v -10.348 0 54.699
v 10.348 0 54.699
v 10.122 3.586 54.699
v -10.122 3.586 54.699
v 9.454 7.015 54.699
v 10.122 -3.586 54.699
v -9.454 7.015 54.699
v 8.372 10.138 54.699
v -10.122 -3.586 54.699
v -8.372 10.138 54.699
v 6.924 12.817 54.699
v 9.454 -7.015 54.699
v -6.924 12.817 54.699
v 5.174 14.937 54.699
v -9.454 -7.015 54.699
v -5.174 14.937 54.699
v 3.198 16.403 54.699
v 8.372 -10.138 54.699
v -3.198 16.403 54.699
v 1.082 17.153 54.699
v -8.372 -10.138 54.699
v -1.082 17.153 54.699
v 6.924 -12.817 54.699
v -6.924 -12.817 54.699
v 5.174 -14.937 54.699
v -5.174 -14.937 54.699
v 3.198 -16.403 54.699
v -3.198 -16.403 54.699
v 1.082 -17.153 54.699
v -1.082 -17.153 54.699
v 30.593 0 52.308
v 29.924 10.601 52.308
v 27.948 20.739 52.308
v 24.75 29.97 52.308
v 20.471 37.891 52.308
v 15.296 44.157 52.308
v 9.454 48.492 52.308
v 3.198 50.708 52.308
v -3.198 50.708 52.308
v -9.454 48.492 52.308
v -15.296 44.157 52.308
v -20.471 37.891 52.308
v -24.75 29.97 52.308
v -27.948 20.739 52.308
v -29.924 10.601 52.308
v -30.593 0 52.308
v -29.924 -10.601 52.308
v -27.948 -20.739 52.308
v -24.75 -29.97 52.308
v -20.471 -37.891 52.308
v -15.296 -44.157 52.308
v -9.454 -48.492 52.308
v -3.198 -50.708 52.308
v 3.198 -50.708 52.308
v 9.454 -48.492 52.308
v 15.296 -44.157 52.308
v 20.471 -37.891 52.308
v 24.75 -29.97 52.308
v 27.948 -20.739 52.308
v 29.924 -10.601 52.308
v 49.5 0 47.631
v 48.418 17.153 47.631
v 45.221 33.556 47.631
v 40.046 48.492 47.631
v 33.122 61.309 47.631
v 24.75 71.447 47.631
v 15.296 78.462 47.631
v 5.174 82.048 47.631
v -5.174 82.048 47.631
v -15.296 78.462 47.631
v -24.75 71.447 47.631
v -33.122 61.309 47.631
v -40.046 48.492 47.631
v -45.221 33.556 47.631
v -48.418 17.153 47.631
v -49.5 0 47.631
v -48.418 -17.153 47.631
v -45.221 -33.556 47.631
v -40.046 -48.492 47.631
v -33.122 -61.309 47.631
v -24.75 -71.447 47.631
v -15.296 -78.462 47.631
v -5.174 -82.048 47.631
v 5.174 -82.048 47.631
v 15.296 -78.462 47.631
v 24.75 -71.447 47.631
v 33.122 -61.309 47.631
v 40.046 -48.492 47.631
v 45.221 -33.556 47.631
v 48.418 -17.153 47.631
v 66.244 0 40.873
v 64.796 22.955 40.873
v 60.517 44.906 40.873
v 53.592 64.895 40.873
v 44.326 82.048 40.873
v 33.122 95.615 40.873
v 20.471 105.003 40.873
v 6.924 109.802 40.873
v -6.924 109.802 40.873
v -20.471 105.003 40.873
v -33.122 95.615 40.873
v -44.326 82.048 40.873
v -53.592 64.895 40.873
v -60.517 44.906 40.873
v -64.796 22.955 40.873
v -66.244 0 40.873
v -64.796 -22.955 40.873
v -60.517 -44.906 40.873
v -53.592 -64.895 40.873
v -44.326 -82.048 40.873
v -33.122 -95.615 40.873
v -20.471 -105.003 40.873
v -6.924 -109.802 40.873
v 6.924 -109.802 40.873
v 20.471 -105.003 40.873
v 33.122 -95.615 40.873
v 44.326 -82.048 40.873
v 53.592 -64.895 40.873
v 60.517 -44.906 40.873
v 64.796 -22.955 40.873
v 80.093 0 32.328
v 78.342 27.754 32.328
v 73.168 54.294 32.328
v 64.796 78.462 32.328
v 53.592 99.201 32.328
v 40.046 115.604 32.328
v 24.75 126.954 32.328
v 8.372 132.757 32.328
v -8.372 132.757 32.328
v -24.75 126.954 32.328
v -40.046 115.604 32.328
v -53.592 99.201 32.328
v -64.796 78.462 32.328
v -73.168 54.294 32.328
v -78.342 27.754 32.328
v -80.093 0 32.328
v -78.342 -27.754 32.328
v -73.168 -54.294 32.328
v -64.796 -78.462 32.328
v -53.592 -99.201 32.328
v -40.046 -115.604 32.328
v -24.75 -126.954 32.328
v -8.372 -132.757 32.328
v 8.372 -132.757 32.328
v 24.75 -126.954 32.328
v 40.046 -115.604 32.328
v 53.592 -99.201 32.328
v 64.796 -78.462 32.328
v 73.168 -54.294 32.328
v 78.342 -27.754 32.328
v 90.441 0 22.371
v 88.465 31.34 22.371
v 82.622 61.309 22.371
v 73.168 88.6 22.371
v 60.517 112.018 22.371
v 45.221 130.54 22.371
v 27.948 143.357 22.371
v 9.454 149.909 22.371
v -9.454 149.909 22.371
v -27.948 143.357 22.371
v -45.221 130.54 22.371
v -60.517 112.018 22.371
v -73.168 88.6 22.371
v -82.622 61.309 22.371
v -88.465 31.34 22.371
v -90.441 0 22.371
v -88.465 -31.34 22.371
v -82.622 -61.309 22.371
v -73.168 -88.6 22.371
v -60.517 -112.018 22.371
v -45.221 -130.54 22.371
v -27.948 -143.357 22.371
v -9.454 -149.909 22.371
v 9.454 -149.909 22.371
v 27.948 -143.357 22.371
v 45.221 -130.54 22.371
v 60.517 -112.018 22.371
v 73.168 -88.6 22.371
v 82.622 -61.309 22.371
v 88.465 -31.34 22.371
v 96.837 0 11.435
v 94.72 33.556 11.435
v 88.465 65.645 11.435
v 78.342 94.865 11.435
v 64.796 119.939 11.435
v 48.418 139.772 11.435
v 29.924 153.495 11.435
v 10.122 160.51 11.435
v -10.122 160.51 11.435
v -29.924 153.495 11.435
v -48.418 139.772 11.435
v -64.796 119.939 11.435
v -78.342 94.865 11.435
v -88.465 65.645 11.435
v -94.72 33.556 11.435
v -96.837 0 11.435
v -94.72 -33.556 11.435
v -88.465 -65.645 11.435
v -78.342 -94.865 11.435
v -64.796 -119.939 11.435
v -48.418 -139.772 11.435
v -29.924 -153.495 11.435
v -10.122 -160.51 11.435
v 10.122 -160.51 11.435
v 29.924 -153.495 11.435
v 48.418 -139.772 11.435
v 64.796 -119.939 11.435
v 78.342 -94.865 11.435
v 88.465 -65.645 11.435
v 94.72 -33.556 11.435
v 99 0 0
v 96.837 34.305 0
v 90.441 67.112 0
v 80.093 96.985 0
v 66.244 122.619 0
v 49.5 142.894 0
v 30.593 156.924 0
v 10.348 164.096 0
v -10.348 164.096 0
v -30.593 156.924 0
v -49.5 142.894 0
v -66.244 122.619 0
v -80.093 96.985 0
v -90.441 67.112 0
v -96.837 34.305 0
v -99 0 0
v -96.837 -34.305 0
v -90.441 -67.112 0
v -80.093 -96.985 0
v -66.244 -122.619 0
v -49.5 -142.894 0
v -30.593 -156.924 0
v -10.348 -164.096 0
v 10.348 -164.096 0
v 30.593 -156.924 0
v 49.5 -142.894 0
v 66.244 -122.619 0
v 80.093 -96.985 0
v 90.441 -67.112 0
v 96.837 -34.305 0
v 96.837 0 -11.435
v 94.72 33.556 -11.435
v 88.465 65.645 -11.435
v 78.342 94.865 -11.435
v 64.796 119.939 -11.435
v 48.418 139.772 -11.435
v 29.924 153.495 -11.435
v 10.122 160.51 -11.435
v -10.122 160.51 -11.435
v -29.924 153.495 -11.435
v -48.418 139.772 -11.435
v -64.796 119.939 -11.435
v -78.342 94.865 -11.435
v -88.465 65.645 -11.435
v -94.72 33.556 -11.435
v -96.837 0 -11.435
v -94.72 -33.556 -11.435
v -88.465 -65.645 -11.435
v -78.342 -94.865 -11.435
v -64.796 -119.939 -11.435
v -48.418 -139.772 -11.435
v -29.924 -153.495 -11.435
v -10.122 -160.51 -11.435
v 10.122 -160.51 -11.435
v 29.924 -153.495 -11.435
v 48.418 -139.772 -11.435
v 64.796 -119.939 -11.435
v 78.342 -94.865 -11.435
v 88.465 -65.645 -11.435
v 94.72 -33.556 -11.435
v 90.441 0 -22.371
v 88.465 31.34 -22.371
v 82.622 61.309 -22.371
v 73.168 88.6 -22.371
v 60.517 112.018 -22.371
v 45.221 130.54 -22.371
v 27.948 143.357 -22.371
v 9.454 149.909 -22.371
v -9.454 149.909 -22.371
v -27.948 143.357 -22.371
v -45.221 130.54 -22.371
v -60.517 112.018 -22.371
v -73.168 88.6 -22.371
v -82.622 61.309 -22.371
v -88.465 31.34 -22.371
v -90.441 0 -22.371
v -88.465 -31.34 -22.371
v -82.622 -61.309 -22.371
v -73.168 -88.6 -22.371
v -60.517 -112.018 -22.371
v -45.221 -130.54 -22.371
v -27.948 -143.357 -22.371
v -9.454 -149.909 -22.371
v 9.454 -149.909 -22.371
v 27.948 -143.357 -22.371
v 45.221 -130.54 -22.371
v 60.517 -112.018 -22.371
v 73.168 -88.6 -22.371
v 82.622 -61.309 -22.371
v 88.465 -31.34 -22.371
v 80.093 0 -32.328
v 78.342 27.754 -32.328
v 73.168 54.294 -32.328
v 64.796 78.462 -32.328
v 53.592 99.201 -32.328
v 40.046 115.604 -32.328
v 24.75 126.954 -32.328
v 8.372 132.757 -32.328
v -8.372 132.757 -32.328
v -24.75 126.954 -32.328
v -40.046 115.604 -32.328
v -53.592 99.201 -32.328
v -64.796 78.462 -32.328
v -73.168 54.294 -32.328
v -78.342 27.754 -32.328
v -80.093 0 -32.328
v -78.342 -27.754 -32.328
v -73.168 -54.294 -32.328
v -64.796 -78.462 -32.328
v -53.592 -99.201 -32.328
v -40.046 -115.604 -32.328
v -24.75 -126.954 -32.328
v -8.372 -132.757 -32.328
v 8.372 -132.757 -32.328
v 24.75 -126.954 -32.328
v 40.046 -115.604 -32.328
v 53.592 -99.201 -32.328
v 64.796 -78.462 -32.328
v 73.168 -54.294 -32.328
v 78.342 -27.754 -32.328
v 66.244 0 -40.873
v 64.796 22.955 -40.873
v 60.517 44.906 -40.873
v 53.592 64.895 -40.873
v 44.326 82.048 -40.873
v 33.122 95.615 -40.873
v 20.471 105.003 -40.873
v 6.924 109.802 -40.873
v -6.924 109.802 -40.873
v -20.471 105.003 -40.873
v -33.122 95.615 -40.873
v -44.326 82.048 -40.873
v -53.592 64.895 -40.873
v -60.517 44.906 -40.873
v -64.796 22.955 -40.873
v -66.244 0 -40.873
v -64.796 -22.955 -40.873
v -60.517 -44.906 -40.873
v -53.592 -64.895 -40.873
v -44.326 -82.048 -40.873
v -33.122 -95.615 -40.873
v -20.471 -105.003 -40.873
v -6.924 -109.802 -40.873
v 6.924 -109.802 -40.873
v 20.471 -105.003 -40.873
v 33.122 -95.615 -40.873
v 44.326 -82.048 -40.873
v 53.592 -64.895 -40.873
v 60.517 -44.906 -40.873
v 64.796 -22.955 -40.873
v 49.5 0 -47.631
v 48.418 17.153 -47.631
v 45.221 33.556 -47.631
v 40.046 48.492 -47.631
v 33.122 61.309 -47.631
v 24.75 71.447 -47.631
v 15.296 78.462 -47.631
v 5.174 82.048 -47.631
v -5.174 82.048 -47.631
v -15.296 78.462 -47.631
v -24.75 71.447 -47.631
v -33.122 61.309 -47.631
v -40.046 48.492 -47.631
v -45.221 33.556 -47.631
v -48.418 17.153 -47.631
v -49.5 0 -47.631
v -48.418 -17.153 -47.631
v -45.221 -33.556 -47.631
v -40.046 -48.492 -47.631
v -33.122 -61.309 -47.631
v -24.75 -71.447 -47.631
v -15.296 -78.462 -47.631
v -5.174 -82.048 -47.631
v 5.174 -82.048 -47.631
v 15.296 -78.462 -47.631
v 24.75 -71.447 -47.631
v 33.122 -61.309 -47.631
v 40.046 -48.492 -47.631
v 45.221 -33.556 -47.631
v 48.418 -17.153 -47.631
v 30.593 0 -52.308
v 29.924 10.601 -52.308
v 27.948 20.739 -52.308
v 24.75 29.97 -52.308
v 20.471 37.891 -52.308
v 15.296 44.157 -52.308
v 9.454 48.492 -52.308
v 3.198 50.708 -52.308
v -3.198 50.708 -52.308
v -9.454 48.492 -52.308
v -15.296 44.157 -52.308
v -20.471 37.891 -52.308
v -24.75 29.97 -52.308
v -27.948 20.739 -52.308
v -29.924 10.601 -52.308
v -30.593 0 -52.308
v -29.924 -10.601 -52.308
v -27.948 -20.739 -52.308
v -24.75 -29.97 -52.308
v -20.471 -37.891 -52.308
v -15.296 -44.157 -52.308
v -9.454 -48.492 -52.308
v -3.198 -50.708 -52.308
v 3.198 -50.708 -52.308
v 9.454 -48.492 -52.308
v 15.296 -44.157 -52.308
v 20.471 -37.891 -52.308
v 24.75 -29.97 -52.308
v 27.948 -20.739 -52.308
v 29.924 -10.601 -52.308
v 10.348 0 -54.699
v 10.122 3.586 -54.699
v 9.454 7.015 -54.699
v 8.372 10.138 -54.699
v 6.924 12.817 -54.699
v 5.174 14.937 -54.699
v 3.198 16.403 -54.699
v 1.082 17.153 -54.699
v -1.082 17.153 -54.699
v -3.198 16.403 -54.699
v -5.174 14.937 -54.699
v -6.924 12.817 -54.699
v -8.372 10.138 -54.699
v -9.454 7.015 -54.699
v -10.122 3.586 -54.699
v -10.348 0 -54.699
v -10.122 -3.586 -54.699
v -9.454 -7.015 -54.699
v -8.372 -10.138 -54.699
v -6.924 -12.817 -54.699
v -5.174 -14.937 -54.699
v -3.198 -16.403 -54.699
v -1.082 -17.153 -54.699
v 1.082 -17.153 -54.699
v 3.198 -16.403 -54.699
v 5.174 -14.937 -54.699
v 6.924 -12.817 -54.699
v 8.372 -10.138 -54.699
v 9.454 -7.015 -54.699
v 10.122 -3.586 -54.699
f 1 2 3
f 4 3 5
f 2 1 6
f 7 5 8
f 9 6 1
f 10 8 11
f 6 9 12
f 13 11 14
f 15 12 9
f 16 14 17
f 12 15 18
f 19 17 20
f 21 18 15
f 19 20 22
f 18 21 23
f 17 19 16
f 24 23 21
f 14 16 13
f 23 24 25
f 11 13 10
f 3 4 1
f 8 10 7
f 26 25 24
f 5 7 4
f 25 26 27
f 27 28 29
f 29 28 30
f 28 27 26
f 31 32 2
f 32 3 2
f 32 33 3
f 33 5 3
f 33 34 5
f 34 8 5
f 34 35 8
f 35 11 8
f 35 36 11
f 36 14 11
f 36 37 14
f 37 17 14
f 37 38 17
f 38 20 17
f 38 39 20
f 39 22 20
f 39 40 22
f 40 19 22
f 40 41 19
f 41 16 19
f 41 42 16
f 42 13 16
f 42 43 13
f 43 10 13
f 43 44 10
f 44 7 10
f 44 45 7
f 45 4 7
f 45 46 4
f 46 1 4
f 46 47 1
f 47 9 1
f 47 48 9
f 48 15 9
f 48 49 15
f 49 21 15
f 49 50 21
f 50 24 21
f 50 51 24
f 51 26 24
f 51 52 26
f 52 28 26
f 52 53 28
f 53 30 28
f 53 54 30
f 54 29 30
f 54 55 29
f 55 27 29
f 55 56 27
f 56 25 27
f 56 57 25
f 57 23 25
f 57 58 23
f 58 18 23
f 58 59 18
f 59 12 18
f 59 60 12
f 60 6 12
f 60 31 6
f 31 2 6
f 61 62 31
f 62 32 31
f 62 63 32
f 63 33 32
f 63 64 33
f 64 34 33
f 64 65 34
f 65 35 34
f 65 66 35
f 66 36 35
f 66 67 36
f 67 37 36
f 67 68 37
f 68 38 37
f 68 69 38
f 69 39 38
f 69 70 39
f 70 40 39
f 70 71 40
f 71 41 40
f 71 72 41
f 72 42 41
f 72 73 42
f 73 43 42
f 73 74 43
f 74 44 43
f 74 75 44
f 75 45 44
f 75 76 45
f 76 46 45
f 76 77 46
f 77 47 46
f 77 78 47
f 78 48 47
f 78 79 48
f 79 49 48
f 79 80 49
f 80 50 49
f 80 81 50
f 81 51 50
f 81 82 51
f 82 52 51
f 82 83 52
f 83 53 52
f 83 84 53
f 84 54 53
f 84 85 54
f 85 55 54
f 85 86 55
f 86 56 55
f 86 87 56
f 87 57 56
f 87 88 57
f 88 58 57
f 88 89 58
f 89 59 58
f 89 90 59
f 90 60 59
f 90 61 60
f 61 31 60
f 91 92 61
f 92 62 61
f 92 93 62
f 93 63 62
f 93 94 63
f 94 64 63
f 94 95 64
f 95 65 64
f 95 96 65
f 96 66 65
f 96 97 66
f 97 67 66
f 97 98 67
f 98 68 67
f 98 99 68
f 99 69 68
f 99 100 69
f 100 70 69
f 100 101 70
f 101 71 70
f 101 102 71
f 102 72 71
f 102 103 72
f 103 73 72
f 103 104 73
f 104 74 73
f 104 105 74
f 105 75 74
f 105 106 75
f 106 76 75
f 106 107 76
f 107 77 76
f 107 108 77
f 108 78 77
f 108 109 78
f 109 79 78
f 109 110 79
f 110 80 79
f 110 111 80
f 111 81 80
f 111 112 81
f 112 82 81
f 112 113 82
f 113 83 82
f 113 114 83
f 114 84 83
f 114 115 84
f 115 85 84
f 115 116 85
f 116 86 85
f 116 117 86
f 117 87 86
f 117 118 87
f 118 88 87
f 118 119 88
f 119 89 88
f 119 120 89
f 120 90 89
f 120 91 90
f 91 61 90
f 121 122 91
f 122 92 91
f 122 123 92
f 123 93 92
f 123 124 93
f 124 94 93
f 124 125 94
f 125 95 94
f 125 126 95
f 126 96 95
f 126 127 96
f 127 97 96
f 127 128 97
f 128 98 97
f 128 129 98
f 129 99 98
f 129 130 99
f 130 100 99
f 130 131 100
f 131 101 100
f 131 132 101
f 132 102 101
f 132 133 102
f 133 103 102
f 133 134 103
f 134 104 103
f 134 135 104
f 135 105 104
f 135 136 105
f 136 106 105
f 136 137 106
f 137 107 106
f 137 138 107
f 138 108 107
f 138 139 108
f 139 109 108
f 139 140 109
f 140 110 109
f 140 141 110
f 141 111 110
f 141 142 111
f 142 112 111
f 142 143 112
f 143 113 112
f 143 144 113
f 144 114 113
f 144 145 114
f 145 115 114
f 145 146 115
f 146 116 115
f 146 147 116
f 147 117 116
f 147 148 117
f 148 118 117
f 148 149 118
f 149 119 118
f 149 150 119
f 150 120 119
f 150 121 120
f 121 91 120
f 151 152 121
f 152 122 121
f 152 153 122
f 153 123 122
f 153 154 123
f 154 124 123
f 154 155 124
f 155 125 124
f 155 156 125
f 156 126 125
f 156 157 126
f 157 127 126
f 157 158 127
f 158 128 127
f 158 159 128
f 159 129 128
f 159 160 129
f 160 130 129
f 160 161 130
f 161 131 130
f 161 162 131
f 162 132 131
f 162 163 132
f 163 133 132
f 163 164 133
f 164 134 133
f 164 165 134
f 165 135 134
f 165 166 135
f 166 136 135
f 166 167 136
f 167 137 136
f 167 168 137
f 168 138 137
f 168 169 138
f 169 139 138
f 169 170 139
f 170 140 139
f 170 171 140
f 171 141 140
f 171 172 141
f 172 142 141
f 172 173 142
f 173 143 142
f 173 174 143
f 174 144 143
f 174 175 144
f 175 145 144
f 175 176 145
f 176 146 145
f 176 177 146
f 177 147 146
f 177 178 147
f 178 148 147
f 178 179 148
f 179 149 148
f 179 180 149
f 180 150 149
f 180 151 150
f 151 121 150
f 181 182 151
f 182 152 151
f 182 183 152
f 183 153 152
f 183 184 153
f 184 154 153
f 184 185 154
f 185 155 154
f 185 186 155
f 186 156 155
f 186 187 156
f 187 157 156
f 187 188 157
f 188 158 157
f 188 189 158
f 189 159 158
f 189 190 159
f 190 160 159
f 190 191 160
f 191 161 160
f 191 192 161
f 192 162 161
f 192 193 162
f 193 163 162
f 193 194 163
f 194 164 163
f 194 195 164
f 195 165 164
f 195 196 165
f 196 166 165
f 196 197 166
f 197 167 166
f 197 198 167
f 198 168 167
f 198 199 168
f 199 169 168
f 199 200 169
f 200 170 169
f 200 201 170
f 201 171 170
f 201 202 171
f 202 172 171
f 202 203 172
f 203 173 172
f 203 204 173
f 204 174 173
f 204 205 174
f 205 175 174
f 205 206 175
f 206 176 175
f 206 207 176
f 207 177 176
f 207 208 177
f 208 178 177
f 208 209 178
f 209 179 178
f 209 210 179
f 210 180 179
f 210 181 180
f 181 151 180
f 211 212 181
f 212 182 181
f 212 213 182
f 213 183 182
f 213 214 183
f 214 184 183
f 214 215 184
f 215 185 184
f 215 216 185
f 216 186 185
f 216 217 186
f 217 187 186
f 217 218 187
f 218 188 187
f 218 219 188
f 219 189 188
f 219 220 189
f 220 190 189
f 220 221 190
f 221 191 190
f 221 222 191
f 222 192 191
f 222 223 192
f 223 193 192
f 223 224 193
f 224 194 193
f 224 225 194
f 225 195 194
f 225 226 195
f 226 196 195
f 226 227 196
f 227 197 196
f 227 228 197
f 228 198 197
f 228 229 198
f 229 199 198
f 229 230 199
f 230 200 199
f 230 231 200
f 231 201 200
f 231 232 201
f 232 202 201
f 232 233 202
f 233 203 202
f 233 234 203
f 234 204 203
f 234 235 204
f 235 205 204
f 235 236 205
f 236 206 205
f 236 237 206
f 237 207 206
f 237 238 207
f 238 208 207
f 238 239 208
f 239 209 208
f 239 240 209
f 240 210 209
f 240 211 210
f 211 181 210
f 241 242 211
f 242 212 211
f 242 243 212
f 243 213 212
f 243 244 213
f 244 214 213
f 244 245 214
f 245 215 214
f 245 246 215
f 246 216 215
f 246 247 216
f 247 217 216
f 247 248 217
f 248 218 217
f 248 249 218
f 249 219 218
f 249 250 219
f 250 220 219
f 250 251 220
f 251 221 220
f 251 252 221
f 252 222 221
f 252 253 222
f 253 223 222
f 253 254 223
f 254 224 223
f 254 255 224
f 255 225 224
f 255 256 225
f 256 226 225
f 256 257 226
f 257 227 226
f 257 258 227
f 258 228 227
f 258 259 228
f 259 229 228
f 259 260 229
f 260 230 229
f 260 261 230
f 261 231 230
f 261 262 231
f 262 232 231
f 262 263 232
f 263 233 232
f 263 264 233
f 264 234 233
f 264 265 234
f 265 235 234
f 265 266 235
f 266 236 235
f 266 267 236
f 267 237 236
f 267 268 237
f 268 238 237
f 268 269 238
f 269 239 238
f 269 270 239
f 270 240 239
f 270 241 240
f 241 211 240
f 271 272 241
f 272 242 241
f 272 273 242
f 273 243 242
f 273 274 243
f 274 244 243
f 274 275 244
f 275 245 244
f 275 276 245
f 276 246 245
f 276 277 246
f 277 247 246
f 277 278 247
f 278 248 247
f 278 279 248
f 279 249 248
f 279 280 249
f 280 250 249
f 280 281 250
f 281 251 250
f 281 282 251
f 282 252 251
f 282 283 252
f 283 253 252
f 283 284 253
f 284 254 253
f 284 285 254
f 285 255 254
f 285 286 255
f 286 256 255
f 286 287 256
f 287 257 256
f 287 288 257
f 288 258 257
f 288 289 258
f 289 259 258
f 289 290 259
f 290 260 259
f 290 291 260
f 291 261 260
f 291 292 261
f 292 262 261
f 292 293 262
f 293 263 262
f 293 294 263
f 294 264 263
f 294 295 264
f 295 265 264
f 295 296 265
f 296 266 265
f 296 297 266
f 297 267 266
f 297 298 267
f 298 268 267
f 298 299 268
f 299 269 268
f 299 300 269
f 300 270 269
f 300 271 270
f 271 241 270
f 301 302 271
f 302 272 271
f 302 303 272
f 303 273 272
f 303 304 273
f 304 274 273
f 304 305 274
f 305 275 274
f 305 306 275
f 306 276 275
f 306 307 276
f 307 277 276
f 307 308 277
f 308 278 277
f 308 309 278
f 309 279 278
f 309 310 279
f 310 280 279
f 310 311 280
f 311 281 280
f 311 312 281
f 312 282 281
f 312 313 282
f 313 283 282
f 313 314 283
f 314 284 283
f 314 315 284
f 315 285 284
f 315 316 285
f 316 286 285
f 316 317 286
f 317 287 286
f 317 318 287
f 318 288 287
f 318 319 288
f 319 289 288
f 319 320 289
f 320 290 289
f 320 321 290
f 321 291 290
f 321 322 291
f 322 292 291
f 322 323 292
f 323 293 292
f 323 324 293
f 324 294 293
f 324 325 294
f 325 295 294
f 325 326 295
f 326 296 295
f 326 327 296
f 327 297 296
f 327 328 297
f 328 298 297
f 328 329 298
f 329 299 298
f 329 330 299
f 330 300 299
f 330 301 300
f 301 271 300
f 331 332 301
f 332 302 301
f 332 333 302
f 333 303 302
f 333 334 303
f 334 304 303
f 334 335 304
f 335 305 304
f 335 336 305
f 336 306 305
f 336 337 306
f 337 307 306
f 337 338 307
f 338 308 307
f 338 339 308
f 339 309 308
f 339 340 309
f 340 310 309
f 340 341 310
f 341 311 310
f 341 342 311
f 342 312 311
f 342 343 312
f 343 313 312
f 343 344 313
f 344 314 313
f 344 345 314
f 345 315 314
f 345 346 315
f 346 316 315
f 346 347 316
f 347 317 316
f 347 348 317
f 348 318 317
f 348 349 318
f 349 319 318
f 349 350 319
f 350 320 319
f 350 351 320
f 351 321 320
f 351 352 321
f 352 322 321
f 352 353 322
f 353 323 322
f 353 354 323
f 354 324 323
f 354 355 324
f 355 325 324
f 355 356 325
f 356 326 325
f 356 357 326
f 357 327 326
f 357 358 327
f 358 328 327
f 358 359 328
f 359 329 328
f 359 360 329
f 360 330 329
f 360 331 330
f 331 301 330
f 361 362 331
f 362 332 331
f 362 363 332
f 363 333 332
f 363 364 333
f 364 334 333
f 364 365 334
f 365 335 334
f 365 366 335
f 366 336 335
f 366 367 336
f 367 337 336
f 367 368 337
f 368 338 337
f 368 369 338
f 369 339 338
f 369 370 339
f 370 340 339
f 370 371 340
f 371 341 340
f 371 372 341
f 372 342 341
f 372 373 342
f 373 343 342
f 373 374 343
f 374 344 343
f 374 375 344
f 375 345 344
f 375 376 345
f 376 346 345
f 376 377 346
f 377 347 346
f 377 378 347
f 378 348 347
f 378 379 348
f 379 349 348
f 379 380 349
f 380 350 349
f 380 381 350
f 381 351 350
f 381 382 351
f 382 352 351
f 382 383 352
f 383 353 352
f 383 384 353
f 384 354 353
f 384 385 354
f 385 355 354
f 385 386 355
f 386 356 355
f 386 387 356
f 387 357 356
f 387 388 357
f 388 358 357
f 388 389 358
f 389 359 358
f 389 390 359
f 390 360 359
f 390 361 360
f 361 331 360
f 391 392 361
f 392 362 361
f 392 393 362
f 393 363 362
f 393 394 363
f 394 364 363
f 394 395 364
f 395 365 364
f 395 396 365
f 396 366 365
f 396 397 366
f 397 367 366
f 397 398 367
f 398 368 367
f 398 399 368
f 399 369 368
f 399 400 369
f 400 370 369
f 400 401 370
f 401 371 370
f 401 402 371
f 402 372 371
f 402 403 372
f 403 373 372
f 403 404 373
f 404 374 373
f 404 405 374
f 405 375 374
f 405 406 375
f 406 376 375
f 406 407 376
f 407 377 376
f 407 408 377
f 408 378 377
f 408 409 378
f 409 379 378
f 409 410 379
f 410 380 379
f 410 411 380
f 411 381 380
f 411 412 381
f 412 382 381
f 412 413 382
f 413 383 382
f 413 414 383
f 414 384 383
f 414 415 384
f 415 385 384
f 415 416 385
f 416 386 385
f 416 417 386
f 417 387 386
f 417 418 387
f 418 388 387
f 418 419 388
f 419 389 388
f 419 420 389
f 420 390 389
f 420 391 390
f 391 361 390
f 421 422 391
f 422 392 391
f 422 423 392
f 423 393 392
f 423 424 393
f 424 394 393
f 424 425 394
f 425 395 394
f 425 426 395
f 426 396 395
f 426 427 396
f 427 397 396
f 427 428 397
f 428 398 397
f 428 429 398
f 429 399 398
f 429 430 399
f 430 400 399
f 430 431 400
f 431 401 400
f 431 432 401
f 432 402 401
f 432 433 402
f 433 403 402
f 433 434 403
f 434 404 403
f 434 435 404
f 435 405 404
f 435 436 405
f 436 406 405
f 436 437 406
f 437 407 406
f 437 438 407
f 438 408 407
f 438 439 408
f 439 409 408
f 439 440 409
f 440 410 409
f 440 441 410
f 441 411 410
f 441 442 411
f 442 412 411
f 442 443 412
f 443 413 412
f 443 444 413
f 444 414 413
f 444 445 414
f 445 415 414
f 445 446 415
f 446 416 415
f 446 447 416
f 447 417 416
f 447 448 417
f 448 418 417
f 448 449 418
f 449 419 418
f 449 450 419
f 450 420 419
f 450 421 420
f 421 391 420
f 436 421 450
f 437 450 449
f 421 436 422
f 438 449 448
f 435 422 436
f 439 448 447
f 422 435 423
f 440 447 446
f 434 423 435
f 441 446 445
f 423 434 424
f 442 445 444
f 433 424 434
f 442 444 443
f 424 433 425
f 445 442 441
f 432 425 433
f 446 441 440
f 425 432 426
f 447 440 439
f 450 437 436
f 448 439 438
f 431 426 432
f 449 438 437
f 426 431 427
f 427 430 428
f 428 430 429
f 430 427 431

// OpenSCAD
// Generated by SolidPython 1.0.1 on 2020-07-29 00:46:49


scale(v = [9, 15, 5]) {
	sphere(r = 11);
}
/***********************************************
*********      SolidPython code:      **********
************************************************
 
# import packages: SolidPython
from solid import *
from solid.utils import *
from itertools import chain, combinations, permutations


class Resize:

    def __init__(self, scad_file):
        self.scad_file = scad_file
        #self.scad_file = import_scad(scad_file)
        # cone/cylinder param:
        self.r1 = 0
        self.r2 = 0
        self.h = 0
        # rectangular prism param:
        self.w = 0
        self.l = 0
        # ellipse param:
        self.r = 0

    # import OpenScad code (file name corresponds to shape)


    # classify shape + parameters
    def assign(self, param1, param2, param3):
        if self.scad_file == 'cone.scad':
            self.r1 = param1
            self.r2 = param2
            self.h = param3
        elif self.scad_file == 'cylinder.scad':
            self.r1 = param1
            self.r2 = param2
            self.h = param3
        elif self.scad_file == 'rectangularPrism.scad':
            self.h = param1
            self.l = param2
            self.w = param3
        else:
            self.r = param1
            self.h = param2

    # resize parameters
    def iterate(self):
        x = range(3, 20, 2)
        i = 1
        if self.scad_file == 'cone.scad':
            tempList = list(permutations(x, 2))
            for temp in tempList:
                param1 = temp[0]
                param2 = temp[1]
                filepath = 'produced_scad_files/' + 'cone' + str(param1) + '_' + str(param2) + '_' + '.scad'
                scad_render_to_file(cylinder(h=param1, r1=param2, r2=0), filepath)

        elif self.scad_file == 'cylinder.scad':
            tempList = list(permutations(x, 3))
            for temp in tempList:
                param1 = temp[0]
                param2 = temp[1]
                filepath = 'produced_scad_files/' + 'cylinder' + str(param1) + '_' + str(param2) + '_' + '.scad'
                scad_render_to_file(cylinder(h=param1, r1=param2, r2=param2), filepath)

        elif self.scad_file == 'rectangularPrism.scad':
            tempList = list(permutations(x, 3))
            for temp in tempList:
                param1 = temp[0]
                param2 = temp[1]
                param3 = temp[2]
                filepath = 'produced_scad_files/' + 'rectangularPrism' + str(param1) + '_' + str(param2) + '_' + str(
                    param3) + '.scad'
                scad_render_to_file(cube(size=(param1, param2, param3)), filepath)

        elif self.scad_file == 'ellipse.scad':
            tempList = list(permutations(x, 4))
            for temp in tempList:
                param1 = temp[0]
                param2 = temp[1]
                param3 = temp[2]
                param4 = temp[3]
                filepath = 'produced_scad_files/' + 'ellipse' + str(param1) + '_' + str(param2) + '_' + str(param3) + '_' + str(param4) + '.scad'
                scad_render_to_file(scale([param1, param2, param3])(sphere(r=param4)), filepath)

    def render_to_scadfile(self):
        scad_render_to_file(scad, 'example.scad') 
 
************************************************/
